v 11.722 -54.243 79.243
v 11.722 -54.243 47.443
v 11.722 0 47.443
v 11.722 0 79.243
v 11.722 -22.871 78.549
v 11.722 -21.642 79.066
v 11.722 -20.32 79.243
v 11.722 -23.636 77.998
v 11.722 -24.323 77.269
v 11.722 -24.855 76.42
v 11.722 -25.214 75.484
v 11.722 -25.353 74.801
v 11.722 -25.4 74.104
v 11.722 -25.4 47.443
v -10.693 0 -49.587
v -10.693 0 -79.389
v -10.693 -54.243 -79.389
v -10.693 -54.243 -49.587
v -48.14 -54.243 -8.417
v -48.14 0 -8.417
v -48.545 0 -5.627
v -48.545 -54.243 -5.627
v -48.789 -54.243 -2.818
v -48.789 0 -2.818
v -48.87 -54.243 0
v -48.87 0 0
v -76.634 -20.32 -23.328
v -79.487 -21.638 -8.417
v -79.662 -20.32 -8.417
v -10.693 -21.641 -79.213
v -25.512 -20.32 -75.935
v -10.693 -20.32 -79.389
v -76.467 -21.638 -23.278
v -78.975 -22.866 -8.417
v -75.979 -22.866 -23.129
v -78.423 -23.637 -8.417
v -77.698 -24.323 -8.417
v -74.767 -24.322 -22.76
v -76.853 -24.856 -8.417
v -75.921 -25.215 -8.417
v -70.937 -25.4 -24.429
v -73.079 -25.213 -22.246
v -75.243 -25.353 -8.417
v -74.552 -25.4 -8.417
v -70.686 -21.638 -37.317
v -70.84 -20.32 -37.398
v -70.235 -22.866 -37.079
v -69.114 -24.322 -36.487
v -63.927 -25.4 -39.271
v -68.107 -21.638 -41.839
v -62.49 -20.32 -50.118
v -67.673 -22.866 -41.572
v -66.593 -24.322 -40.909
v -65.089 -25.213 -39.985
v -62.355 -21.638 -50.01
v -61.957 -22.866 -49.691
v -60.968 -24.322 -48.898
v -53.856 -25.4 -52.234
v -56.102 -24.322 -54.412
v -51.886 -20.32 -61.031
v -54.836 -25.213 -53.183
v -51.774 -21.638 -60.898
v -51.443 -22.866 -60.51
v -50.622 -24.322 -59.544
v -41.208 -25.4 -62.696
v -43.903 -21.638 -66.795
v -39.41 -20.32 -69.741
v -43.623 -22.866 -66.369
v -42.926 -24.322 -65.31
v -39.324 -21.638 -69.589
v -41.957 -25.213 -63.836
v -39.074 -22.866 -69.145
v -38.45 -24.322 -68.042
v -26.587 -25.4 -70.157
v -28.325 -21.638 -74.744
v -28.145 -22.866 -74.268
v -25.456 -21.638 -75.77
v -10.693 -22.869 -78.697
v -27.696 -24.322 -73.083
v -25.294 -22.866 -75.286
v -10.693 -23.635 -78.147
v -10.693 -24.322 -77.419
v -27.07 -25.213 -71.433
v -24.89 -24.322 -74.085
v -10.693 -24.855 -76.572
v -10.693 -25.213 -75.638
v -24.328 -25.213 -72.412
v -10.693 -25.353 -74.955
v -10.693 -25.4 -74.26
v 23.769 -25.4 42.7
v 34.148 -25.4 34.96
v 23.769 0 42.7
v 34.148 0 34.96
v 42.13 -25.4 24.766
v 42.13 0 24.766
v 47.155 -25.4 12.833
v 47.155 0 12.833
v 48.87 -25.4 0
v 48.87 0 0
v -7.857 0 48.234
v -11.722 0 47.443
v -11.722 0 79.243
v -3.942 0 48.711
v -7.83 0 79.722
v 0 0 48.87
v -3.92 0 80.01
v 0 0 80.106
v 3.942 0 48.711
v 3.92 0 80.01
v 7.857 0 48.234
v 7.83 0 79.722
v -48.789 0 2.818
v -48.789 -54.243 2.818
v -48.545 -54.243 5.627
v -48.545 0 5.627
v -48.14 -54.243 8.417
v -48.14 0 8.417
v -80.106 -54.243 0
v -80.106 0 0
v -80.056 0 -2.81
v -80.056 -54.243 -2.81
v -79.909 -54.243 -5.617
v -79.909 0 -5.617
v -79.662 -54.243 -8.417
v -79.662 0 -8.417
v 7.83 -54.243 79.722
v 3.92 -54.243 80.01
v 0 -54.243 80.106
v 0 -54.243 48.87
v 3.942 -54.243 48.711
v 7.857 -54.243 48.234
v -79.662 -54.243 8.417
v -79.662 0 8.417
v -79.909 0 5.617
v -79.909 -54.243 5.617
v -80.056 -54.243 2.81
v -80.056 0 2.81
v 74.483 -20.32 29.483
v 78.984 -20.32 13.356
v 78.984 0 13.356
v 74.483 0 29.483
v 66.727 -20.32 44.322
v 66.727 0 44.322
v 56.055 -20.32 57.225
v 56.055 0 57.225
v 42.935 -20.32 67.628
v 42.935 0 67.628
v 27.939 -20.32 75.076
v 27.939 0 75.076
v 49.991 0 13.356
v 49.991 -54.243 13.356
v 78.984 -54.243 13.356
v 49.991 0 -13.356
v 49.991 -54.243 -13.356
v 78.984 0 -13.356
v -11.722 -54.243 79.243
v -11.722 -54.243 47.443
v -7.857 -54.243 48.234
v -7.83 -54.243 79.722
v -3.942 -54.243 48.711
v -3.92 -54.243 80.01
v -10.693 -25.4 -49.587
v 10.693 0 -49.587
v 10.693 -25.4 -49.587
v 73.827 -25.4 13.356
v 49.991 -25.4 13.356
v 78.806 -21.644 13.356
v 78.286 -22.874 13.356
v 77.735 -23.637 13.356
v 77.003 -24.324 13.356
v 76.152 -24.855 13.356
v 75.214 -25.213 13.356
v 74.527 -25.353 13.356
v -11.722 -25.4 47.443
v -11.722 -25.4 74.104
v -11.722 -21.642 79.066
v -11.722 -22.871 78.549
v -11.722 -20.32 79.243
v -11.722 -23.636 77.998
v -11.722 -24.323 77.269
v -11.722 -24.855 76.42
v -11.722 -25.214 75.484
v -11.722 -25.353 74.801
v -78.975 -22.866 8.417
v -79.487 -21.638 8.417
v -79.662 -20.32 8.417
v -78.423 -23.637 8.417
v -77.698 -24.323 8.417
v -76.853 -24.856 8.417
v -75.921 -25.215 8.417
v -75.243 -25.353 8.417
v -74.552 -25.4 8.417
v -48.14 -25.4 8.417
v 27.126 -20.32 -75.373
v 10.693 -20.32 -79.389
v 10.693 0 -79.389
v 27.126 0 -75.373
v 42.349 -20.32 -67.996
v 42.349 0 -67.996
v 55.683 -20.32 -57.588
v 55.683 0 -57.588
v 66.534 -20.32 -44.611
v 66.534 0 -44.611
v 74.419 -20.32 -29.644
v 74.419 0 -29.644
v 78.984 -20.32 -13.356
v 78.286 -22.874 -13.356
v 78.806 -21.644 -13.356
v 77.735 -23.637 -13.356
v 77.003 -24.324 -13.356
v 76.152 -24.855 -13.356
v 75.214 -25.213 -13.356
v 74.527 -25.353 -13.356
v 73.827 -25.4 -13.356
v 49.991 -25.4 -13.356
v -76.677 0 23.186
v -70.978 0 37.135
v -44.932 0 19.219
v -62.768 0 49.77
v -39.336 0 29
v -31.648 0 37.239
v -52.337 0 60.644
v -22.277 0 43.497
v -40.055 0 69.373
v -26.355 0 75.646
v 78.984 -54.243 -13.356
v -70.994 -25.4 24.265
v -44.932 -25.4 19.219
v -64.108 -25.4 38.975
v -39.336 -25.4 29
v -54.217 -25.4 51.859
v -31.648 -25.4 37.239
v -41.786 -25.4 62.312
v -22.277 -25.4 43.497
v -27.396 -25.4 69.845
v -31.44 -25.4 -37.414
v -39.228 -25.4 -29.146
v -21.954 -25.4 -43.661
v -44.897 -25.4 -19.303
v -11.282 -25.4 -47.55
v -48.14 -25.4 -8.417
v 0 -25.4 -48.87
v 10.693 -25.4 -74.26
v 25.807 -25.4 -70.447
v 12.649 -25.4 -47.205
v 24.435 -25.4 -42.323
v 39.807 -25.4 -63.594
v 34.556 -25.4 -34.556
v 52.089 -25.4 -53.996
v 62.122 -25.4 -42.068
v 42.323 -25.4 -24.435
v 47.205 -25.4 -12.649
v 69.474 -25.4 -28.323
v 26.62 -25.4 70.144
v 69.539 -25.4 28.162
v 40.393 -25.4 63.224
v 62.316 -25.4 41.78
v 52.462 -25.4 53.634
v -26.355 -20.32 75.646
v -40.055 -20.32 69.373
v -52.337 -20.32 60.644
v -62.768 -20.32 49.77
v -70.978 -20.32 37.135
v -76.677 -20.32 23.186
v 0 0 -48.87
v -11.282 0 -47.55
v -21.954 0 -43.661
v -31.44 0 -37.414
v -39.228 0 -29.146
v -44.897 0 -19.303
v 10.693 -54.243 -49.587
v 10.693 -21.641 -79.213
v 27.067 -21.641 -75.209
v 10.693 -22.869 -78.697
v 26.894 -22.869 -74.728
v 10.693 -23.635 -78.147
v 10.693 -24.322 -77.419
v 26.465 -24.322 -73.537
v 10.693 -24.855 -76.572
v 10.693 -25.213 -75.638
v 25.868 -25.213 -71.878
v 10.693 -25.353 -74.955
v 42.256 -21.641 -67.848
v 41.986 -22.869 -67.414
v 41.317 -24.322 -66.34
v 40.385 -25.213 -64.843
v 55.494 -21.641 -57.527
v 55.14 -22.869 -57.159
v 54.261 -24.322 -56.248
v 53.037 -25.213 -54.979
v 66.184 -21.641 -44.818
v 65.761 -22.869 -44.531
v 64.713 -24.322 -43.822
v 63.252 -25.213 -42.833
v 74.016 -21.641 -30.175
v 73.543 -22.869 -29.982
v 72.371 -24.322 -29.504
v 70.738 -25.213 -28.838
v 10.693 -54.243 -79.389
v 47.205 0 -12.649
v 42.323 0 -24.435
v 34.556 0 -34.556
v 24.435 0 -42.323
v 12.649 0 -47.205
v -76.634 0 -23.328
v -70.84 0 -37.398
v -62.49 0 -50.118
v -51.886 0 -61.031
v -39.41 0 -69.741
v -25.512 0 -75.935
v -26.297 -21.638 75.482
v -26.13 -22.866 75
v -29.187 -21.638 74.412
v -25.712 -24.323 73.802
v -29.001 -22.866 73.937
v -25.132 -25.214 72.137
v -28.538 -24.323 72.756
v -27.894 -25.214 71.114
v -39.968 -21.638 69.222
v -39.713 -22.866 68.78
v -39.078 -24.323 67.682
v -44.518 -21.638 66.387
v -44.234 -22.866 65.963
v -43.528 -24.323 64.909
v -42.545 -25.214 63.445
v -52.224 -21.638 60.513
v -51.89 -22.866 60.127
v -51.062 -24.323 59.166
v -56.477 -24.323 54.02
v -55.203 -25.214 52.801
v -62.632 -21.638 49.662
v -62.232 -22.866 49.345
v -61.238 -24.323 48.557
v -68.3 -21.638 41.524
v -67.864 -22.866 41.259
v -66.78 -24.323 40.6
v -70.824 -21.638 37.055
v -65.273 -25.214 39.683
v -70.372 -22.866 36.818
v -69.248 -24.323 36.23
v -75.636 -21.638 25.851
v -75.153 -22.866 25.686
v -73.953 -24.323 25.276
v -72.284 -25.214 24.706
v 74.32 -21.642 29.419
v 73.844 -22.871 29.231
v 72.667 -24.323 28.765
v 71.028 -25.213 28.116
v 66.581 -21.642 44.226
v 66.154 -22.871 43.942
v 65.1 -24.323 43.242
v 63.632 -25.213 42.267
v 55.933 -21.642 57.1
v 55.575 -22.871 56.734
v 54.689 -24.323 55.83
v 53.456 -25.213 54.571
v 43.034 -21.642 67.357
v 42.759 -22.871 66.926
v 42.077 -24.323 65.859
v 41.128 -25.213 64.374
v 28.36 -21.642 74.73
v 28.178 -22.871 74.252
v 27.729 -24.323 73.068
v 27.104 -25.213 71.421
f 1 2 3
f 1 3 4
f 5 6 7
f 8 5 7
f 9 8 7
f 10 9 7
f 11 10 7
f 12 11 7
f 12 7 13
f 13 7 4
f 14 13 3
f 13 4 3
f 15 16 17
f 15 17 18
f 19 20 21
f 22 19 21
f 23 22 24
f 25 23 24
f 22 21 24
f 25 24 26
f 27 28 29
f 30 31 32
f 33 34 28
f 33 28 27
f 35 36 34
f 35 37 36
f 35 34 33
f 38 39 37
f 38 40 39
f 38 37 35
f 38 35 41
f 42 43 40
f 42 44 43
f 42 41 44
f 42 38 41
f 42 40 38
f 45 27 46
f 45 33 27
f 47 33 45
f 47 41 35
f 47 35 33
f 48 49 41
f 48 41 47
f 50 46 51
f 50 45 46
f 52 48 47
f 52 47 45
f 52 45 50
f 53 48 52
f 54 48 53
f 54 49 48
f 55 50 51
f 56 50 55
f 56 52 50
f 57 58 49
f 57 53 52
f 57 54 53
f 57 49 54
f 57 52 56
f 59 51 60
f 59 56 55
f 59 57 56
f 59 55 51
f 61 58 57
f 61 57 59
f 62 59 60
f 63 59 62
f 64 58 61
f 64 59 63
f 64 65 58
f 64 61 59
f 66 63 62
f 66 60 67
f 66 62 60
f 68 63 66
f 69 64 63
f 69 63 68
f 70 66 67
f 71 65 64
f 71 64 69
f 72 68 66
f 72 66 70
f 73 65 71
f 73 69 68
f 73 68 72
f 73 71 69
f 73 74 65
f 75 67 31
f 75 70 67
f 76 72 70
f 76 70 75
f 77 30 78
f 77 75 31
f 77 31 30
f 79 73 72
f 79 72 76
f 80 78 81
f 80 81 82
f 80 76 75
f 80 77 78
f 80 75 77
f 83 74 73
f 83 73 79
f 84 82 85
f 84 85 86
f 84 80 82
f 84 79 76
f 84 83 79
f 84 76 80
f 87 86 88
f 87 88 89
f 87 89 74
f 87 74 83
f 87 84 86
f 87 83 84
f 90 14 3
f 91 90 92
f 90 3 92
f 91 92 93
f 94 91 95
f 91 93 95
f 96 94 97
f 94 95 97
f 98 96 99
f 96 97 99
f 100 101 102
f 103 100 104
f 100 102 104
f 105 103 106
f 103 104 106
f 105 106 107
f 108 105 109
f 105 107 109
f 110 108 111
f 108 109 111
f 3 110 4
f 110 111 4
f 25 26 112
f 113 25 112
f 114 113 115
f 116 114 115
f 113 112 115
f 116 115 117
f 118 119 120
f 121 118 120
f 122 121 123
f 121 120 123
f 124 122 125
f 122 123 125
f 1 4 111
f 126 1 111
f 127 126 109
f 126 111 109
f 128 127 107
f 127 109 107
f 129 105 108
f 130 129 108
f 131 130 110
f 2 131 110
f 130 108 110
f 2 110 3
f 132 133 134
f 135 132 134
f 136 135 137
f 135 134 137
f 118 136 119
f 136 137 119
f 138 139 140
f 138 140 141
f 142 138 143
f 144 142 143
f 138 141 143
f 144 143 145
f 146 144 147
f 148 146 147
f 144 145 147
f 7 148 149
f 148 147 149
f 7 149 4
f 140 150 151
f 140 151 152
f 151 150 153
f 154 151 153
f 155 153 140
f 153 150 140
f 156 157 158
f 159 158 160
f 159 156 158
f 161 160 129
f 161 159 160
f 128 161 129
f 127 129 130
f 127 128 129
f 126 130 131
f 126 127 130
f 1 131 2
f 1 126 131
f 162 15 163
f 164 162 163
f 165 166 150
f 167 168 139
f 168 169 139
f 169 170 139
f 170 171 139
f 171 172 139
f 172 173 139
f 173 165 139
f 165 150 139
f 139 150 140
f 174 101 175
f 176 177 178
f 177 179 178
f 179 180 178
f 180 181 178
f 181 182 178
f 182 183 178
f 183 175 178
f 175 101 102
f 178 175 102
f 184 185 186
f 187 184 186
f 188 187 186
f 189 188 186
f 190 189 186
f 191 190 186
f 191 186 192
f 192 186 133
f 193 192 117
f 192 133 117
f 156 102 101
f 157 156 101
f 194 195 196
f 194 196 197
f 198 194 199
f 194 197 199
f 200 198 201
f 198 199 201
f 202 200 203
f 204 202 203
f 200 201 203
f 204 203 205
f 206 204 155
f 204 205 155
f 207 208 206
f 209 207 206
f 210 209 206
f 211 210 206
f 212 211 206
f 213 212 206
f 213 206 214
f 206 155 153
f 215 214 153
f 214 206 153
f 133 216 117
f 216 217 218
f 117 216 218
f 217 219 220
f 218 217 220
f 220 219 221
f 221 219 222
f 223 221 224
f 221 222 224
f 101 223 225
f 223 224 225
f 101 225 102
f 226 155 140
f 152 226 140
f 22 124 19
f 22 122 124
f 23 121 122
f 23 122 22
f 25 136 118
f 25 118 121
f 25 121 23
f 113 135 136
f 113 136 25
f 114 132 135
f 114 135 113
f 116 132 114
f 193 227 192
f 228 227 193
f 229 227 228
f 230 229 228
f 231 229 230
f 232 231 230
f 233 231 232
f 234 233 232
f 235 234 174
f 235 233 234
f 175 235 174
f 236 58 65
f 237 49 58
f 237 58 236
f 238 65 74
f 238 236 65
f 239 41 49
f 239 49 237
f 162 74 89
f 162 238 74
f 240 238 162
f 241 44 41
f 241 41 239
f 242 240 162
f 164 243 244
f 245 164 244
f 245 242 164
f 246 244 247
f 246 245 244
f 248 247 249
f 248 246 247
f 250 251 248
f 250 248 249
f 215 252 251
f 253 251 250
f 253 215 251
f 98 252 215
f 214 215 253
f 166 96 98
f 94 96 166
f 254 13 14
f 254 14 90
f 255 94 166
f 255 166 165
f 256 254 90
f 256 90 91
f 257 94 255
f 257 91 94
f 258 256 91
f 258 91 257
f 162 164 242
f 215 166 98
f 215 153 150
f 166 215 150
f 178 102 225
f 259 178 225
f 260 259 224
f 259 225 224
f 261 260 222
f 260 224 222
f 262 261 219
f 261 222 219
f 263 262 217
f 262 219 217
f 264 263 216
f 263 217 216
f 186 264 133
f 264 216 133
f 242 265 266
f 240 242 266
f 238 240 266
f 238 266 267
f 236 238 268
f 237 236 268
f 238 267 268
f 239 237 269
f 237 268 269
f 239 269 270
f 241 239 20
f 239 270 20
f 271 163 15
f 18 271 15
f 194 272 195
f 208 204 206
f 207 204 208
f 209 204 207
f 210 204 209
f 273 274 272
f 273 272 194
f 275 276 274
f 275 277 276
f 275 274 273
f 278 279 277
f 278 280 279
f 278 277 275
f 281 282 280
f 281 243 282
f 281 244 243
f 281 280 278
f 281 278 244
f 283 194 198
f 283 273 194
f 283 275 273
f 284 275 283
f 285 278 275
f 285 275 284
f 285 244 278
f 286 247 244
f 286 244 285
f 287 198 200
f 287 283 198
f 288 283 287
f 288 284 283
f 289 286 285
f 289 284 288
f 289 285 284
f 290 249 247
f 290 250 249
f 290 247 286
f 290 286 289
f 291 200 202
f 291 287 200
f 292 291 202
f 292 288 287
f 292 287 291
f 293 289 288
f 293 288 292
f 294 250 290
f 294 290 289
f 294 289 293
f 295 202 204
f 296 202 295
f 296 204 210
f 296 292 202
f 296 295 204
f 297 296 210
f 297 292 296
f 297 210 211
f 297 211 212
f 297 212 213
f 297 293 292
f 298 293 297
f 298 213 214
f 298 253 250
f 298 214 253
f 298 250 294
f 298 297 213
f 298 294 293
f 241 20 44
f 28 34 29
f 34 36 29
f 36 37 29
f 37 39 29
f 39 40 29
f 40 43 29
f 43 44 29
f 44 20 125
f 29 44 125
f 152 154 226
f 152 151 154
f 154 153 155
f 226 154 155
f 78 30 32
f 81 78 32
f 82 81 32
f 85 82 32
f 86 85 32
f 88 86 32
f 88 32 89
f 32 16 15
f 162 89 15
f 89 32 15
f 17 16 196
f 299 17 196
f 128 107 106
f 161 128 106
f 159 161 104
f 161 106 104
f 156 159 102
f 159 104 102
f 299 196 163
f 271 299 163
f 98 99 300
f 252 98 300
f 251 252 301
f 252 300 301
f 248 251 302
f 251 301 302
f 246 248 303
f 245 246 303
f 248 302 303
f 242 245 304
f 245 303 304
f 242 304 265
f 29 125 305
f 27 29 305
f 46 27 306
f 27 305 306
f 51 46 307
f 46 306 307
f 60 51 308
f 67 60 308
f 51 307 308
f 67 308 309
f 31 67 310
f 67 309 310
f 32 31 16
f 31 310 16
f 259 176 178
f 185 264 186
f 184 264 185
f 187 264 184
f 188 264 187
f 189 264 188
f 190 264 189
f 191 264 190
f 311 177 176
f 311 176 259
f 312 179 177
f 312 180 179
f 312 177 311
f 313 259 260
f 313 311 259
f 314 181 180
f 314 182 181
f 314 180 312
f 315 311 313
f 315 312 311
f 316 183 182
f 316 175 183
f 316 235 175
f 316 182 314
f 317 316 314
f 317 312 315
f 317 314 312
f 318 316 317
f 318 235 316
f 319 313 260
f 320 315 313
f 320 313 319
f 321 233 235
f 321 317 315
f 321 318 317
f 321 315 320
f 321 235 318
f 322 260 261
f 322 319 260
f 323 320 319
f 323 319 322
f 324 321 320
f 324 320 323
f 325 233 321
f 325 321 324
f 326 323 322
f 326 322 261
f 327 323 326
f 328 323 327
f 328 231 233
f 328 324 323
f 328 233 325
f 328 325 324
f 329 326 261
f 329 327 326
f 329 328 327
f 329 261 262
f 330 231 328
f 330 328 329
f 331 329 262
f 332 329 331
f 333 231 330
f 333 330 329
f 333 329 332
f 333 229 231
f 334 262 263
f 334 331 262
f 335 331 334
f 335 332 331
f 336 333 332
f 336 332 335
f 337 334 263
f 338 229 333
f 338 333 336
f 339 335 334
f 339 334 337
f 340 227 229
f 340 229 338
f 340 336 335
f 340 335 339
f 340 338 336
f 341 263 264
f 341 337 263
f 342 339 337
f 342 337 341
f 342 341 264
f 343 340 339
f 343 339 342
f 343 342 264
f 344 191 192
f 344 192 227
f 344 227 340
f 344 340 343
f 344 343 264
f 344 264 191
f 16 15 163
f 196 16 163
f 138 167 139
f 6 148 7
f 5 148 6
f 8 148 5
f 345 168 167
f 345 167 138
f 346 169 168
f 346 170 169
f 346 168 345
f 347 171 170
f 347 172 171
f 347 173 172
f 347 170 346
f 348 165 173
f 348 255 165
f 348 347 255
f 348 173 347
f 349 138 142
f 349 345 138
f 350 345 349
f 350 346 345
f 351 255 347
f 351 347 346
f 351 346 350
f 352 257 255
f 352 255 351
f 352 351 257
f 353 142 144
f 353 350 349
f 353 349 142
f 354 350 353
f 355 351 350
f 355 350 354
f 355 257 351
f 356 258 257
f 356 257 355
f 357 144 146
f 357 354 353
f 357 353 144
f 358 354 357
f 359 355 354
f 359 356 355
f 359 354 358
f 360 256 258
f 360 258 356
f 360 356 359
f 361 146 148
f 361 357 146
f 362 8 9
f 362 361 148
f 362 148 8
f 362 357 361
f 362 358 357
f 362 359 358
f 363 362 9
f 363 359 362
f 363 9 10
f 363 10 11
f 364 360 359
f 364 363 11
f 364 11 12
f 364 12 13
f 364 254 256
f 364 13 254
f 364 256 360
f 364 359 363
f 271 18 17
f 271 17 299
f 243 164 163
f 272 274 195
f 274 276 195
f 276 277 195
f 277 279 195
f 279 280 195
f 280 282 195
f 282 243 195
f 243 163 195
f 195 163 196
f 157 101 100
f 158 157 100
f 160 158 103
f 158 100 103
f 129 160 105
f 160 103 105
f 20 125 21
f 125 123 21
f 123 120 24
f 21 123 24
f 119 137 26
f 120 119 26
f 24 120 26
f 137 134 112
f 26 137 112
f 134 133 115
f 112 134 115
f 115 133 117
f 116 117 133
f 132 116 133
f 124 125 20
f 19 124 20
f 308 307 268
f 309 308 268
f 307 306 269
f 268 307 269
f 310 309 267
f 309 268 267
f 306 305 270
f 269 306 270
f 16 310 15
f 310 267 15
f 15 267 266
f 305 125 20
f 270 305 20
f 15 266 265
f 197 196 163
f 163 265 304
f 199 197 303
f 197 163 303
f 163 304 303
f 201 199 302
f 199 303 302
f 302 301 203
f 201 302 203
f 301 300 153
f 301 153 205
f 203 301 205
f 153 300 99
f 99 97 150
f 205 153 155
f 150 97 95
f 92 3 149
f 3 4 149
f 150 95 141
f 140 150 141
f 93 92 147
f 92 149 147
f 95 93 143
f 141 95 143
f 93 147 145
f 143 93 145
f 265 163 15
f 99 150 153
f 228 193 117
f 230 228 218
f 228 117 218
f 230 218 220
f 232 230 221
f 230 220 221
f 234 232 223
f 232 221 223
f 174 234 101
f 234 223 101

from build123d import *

# Parameters (mm, degrees)
F1_DEPTH = 25.4
F2_DEPTH = 54.2429313064
F0_W     = 28.9929530091
F0_H     = 13.3561033948
F0_W_2   = 10.6932765457
F0_H_2   = 29.8016675711
F3_R     = 5.08
F3_2_R   = 5.08


with BuildPart() as f1:
    # F0 (on Front) → F1 (new body)
    with BuildSketch(Plane.XZ):
        with BuildLine():
            ThreePointArc((11.7221610006, 47.4434716165), (38.4782788305, 30.1282942728), (48.8701550801, 0))
            Line((48.8701550801, 0), (49.9914412338, 0))
            Line((49.9914412338, 0), (49.9914412338, 13.3561033948))
            Line((49.9914412338, 13.3561033948), (78.9843942429, 13.3561033948))
            ThreePointArc((78.9843942429, 13.3561033948), (56.055353156, 57.2251466959), (11.7221610006, 79.2433654844))
            Line((11.7221610006, 79.2433654844), (11.7221610006, 47.4434716165))
        make_face()
        with BuildLine():
            Line((49.9914412338, 0), (48.8701550801, 0))
            ThreePointArc((48.8701550801, 0), (34.5564180548, -34.5564180548), (0, -48.8701550801))
            Line((0, -48.8701550801), (0, -49.5870839528))
            Line((0, -49.5870839528), (10.6932765457, -49.5870839528))
            Line((10.6932765457, -49.5870839528), (10.6932765457, -79.3887515239))
            ThreePointArc((10.6932765457, -79.3887515239), (55.6830208794, -57.5875092148), (78.9843942429, -13.3561033948))
            Line((78.9843942429, -13.3561033948), (49.9914412338, -13.3561033948))
            Line((49.9914412338, -13.3561033948), (49.9914412338, 0))
        make_face()
        with BuildLine():
            Line((0, -49.5870839528), (0, -48.8701550801))
            ThreePointArc((0, -48.8701550801), (-31.4400806584, -37.4140800468), (-48.1398797488, -8.4168898844))
            Line((-48.1398797488, -8.4168898844), (-79.6622620598, -8.4168898844))
            ThreePointArc((-79.6622620598, -8.4168898844), (-57.4480819986, -55.8268564984), (-10.6932765457, -79.3887515239))
            Line((-10.6932765457, -79.3887515239), (-10.6932765457, -49.5870839528))
            Line((-10.6932765457, -49.5870839528), (0, -49.5870839528))
        make_face()
    extrude(amount=F1_DEPTH)

    # F3
    f3_edges = [f1.edges().sort_by_distance(p)[0] for p in [
        (-57.448082, -25.4, -55.826856),
        (56.055353, -25.4, 57.225147),
        (55.683021, -25.4, -57.587509),
    ]]
    fillet(f3_edges, radius=F3_R)


with BuildPart() as f1b:
    # F0 (on Front) → F1, piece 2 (new body)
    with BuildSketch(Plane.XZ):
        with BuildLine():
            ThreePointArc((-48.1398797488, 8.4168898844), (-35.7300224054, 33.341529006), (-11.7221610006, 47.4434716165))
            Line((-11.7221610006, 47.4434716165), (-11.7221610006, 79.2433654844))
            ThreePointArc((-11.7221610006, 79.2433654844), (-57.8089578353, 55.4530831047), (-79.6622620598, 8.4168898844))
            Line((-79.6622620598, 8.4168898844), (-48.1398797488, 8.4168898844))
        make_face()
    extrude(amount=F1_DEPTH)

    # F3#2
    f3_2_edges = [f1b.edges().sort_by_distance(p)[0] for p in [
        (-57.808958, -25.4, 55.453083),
    ]]
    fillet(f3_2_edges, radius=F3_2_R)


with BuildPart() as f2:
    # F0 (on Front) → F2 (new body)
    with BuildSketch(Plane.XZ):
        with BuildLine():
            ThreePointArc((0, 48.8701550801), (5.9043307036, 48.5121730754), (11.7221610006, 47.4434716165))
            Line((11.7221610006, 47.4434716165), (11.7221610006, 79.2433654844))
            ThreePointArc((11.7221610006, 79.2433654844), (5.8769176771, 79.8898108048), (0, 80.1056803967))
            Line((0, 80.1056803967), (0, 48.8701550801))
        make_face()
        with BuildLine():
            ThreePointArc((-11.7221610006, 47.4434716165), (-5.9043307036, 48.5121730754), (0, 48.8701550801))
            Line((0, 48.8701550801), (0, 80.1056803967))
            ThreePointArc((0, 80.1056803967), (-5.8769176771, 79.8898108048), (-11.7221610006, 79.2433654844))
            Line((-11.7221610006, 79.2433654844), (-11.7221610006, 47.4434716165))
        make_face()
    extrude(amount=F2_DEPTH)


with BuildPart() as f2b:
    # F0 (on Front) → F2, piece 2 (new body)
    with BuildSketch(Plane.XZ):
        with Locations((64.4879177384, -6.6780516974)):
            Rectangle(F0_W, F0_H)
        with Locations((64.4879177384, 6.6780516974)):
            Rectangle(F0_W, F0_H)
    extrude(amount=F2_DEPTH)


with BuildPart() as f2c:
    # F0 (on Front) → F2, piece 3 (new body)
    with BuildSketch(Plane.XZ):
        with BuildLine():
            Line((-79.6622620598, -8.4168898844), (-48.1398797488, -8.4168898844))
            ThreePointArc((-48.1398797488, -8.4168898844), (-48.6872439475, -4.2242554783), (-48.8701550801, 0))
            Line((-48.8701550801, 0), (-80.1056803967, 0))
            ThreePointArc((-80.1056803967, 0), (-79.9947490028, -4.2142809335), (-79.6622620598, -8.4168898844))
        make_face()
        with BuildLine():
            ThreePointArc((-48.8701550801, 0), (-48.6872439475, 4.2242554783), (-48.1398797488, 8.4168898844))
            Line((-48.1398797488, 8.4168898844), (-79.6622620598, 8.4168898844))
            ThreePointArc((-79.6622620598, 8.4168898844), (-79.9947490028, 4.2142809335), (-80.1056803967, 0))
            Line((-80.1056803967, 0), (-48.8701550801, 0))
        make_face()
    extrude(amount=F2_DEPTH)


with BuildPart() as f2d:
    # F0 (on Front) → F2, piece 4 (new body)
    with BuildSketch(Plane.XZ):
        with Locations((5.3466382728, -64.4879177384)):
            Rectangle(F0_W_2, F0_H_2)
        with Locations((-5.3466382728, -64.4879177384)):
            Rectangle(F0_W_2, F0_H_2)
    extrude(amount=F2_DEPTH)


solid = Compound([f1.part, f1b.part, f2.part, f2b.part, f2c.part, f2d.part])
